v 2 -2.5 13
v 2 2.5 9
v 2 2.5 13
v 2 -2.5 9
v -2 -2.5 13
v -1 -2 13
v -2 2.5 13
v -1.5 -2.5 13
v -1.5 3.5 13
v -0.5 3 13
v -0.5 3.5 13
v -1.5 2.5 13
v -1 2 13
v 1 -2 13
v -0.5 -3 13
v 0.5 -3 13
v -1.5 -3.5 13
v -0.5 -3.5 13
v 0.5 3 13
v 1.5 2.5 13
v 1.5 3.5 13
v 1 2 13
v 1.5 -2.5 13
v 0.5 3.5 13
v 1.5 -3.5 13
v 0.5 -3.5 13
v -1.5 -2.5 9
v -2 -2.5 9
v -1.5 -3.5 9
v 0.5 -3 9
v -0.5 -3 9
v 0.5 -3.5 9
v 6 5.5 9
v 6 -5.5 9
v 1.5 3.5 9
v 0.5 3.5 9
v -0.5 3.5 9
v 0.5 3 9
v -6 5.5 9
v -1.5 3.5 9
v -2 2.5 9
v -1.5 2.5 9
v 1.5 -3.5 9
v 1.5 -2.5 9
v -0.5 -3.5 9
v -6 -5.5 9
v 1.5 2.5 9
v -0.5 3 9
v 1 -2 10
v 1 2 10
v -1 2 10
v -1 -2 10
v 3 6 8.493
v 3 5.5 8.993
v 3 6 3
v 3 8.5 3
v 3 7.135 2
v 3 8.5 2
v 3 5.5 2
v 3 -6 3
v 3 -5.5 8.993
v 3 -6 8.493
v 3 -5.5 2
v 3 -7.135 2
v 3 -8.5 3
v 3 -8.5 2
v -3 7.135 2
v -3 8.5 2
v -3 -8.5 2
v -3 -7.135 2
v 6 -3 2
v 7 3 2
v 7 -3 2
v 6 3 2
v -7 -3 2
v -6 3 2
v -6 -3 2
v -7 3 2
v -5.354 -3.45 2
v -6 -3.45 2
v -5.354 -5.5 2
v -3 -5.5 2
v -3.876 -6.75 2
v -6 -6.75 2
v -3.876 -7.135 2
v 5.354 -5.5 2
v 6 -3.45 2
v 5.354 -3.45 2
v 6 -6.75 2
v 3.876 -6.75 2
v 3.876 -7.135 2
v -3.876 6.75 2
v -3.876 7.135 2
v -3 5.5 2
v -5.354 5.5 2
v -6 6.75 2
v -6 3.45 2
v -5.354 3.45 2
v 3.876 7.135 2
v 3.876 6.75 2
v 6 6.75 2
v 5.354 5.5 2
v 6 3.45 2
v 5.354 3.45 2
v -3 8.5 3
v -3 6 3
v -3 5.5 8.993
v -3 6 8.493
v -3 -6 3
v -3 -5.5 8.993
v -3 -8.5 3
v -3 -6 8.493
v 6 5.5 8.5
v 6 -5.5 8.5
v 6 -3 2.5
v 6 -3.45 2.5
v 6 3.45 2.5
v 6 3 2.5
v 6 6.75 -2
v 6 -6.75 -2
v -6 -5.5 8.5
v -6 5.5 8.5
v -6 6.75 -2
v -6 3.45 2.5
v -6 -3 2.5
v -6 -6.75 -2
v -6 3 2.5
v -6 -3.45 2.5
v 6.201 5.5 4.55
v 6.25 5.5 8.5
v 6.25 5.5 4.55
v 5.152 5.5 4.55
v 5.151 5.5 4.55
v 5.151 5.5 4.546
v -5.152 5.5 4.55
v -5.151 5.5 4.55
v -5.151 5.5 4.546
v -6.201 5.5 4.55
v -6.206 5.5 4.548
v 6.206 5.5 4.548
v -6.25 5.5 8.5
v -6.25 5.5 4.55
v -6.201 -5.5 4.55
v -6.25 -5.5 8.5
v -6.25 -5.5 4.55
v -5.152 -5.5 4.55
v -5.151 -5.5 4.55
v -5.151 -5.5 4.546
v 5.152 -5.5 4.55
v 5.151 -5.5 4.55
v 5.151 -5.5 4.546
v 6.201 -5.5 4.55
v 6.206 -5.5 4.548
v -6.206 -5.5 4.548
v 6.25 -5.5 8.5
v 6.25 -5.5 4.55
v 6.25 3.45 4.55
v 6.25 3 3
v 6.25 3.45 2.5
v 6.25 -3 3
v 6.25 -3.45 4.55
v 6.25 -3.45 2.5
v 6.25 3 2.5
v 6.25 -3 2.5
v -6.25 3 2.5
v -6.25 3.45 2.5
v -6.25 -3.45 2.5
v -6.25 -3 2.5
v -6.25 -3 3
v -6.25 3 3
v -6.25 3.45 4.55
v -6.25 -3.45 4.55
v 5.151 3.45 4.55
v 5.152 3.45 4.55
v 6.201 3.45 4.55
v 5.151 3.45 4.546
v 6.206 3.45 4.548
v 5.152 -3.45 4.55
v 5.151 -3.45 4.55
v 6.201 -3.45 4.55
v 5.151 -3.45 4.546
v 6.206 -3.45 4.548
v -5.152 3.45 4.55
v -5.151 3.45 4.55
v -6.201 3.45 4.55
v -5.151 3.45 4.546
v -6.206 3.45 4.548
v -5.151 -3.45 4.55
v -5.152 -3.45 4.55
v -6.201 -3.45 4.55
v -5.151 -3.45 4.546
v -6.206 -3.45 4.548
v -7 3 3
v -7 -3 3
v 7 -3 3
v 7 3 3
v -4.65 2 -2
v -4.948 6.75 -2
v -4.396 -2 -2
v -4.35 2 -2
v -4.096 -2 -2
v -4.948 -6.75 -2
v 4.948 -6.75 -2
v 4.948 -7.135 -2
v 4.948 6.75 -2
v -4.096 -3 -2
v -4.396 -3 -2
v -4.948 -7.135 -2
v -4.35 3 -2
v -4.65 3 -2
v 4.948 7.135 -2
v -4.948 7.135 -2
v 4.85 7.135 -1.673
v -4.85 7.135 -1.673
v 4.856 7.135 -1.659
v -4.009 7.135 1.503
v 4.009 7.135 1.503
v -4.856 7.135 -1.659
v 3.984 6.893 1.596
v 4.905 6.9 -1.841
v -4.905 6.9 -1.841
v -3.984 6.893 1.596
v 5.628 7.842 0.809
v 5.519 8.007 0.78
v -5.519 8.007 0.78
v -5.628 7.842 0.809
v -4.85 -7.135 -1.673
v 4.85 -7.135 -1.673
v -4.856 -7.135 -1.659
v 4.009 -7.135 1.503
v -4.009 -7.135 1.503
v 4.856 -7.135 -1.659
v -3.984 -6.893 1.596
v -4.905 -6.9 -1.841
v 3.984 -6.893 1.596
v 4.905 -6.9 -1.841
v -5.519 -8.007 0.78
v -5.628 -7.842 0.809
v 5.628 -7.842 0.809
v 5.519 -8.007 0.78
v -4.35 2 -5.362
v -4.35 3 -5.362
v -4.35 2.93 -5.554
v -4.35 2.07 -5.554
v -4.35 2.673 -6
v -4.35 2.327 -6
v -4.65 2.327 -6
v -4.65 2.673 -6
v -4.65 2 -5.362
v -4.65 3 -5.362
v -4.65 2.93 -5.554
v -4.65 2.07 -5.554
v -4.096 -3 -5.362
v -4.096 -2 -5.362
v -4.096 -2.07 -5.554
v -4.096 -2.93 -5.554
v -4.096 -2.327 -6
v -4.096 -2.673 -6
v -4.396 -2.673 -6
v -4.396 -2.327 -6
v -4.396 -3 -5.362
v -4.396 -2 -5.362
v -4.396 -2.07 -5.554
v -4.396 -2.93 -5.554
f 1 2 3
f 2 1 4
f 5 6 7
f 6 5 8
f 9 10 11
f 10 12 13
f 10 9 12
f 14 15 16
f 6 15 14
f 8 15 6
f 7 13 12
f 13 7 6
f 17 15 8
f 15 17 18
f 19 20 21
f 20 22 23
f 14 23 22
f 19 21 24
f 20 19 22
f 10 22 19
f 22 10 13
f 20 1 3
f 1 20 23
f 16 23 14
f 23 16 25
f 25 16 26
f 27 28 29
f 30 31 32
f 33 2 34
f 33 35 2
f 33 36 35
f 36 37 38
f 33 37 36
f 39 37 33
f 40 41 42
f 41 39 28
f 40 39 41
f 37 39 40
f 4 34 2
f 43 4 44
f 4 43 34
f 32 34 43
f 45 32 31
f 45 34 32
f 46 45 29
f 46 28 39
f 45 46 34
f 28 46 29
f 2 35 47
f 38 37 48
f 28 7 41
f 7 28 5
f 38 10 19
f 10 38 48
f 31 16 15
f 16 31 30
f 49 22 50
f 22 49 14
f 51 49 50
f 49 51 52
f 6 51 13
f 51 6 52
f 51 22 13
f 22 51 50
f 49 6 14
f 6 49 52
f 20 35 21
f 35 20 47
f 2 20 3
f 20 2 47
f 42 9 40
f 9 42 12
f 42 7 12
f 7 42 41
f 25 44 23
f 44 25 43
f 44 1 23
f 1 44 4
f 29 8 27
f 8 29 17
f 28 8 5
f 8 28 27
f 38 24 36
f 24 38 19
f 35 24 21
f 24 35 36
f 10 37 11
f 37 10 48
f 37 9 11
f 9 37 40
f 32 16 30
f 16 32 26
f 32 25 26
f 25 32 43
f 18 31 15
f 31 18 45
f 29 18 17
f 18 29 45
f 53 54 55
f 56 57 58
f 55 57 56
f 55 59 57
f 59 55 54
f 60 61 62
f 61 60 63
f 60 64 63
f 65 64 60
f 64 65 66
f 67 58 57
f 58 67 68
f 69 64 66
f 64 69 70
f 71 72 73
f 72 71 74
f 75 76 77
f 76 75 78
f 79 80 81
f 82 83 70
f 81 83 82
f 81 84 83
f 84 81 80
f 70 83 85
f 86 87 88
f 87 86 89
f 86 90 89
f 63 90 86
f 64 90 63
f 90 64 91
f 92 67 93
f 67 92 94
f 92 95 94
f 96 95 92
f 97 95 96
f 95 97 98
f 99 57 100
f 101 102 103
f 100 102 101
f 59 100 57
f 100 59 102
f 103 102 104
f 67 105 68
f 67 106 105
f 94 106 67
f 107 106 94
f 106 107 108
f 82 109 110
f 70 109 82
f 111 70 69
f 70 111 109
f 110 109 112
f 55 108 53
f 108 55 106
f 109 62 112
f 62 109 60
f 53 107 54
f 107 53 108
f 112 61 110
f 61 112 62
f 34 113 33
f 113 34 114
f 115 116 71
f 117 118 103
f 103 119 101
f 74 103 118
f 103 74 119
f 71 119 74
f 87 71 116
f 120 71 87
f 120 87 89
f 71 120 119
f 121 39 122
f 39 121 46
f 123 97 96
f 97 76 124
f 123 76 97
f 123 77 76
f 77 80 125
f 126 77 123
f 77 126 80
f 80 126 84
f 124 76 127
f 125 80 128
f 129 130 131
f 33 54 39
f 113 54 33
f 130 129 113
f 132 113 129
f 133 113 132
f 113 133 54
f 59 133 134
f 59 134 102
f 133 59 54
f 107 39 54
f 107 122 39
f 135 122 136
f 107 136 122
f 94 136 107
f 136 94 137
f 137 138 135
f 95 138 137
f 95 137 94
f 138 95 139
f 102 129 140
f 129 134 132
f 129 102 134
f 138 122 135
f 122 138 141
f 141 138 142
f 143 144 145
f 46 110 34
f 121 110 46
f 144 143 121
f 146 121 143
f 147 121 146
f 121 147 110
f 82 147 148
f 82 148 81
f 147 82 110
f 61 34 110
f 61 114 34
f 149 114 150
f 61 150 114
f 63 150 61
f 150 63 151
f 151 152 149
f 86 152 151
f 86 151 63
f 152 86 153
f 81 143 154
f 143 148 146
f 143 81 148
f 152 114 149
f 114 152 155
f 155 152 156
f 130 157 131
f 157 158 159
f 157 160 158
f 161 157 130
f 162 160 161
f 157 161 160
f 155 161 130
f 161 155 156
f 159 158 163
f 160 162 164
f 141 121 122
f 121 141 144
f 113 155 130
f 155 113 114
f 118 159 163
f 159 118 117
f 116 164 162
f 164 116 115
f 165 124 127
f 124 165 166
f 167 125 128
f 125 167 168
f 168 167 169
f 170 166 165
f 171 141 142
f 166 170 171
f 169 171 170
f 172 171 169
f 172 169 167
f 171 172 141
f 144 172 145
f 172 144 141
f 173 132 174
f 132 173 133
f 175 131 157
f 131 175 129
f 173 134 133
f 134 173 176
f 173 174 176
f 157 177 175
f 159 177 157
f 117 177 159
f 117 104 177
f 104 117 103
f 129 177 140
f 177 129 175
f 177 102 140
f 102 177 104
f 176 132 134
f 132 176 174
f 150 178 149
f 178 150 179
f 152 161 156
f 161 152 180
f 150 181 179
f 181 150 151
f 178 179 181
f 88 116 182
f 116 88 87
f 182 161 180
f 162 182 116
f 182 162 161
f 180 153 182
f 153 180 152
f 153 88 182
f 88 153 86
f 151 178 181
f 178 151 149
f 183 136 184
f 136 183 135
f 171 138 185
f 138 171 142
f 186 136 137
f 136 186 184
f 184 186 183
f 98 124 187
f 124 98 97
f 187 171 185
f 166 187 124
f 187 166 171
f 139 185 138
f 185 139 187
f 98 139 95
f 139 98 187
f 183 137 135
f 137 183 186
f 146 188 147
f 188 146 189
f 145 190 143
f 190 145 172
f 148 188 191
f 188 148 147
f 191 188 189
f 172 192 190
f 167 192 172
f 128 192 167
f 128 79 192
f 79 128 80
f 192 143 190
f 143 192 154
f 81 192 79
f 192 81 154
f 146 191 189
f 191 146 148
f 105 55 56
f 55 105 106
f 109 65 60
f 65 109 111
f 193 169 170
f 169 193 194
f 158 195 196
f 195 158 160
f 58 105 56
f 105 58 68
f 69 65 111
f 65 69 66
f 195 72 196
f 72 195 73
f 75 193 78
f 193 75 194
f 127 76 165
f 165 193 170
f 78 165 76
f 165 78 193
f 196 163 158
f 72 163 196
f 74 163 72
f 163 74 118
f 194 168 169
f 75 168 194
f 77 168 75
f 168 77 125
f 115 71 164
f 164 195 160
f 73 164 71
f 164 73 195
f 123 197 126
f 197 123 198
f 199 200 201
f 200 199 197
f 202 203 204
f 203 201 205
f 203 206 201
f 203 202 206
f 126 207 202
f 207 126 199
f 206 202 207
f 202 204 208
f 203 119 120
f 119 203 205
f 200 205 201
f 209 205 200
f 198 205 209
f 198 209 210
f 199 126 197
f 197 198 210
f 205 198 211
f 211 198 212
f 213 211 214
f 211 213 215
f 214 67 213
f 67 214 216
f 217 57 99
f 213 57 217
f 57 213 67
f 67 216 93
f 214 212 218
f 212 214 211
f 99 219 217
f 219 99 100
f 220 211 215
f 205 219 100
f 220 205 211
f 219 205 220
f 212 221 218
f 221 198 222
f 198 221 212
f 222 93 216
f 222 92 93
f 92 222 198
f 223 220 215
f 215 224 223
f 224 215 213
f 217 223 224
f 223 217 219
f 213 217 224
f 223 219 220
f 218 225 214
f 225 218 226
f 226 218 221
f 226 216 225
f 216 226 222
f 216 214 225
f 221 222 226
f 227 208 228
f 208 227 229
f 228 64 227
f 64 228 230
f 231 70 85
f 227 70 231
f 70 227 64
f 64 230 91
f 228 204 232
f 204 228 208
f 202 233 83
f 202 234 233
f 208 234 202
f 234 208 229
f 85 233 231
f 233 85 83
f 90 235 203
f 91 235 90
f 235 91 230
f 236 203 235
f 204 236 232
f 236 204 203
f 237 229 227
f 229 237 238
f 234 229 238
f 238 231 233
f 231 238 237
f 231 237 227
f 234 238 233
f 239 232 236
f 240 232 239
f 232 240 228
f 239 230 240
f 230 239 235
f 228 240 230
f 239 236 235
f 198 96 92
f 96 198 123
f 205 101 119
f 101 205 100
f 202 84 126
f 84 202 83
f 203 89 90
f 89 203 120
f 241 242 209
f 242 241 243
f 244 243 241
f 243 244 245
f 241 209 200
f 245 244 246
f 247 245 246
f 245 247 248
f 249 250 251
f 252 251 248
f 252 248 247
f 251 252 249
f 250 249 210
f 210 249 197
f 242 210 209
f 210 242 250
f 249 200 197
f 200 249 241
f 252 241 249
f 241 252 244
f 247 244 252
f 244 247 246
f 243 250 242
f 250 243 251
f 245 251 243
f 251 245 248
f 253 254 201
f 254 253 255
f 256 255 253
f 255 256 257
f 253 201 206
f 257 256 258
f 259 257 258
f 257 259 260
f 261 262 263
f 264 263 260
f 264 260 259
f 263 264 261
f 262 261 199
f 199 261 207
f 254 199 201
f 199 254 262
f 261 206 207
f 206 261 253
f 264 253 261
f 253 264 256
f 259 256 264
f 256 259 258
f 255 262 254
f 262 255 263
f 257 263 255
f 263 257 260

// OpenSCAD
module stem(){
  difference(){
    cube([4,6,4],center=true);
    translate([0,0,1])cube([2,4,4],center=true);
    translate([2,3,0])cube([1,1,4.2],center=true);
    translate([-2,3,0])cube([1,1,4.2],center=true);
    translate([2,-3,0])cube([1,1,4.2],center=true);
    translate([-2,-3,0])cube([1,1,4.2],center=true);
  }
  
  
  translate([1,3,0])cube([1,1,4],center=true);
  translate([-1,3,0])cube([1,1,4],center=true);
  translate([1,-3,0])cube([1,1,4],center=true);
  translate([-1,-3,0])cube([1,1,4],center=true);
}

module top(){
  module d(){
    difference(){
      cube([1.1,2.1,3.1],center=true);
      translate([-0.54,0,0])rotate([0,18.5,0])cube([1,2.2,3.6],center=true);
    }
  }
  
  cube([6,17,1],center=true);
  cube([14,6,1],center=true);

  translate([0,0,3]){
    difference(){
      union(){
        cube([12,11,7],center=true);
        cube([12.5,11,6],center=true);
        difference(){
          cube([6,12,7],center=true);
          translate([0,6,3.7])rotate([45,0,0])cube([7,1,2],center=true);
          translate([0,-6,3.7])rotate([-45,0,0])cube([7,1,2],center=true);
        }
        
      }
      translate([12*0.5-0.299,11*0.5-1,-2.5])d();
      translate([12*0.5-0.299,-11*0.5+1,-2.5])d();
      
      translate([-12*0.5+0.299,11*0.5-1,-2.5])rotate([0,0,180])d();
      translate([-12*0.5+0.299,-11*0.5+1,-2.5])rotate([0,0,180])d();
    }
  }
}

module bottom(){
  
  module f(){
    difference(){
      cube([3,0.2,3],center=true);
      translate([-1.05,0,-1.05])rotate([0,45,0])cube([6,0.5,3],center=true);
    }
  }

  module bSide(){
    difference(){
      cube([10,0.5,4],center=true);
    
      translate([7,0,0])rotate([0,-15,0])cube([5,1,6],center=true);
      translate([-7,0,0])rotate([0,15,0])cube([5,1,6],center=true);
    }
    
    module e(){translate([4,-0.14,0])rotate([-9,45/2,30])f();}
    
    e();
    mirror([1,0,0])e();
  }
  
  cube([12,13.5,4],center=true);
  translate([0,13.5*0.51,0])bSide();
  translate([0,-13.5*0.51,0])rotate([0,0,180])bSide();
}

module legs(){
  module leg(){
    difference(){
      cube([0.3,1,4],center=true);
      
      translate([0,-0.8,-2])rotate([20,0,0])cube([1,1,2],center=true);
      translate([0,-0.75,-2])rotate([30,0,0])cube([1,1,2],center=true);
      translate([0,0.8,-2])rotate([-20,0,0])cube([1,1,2],center=true);
      translate([0,0.75,-2])rotate([-30,0,0])cube([1,1,2],center=true);
    }
  }
  
  translate([0,2.5,0])leg();
  translate([0.254,-2.5,0])leg();
}

union(){
  translate([0,0,11])stem();
  translate([0,0,2.5])top();
  bottom();
  translate([-(13*0.5-2),0,-4])legs();
}

//translate([20,0,0])import("ALPS-switch.stl");
